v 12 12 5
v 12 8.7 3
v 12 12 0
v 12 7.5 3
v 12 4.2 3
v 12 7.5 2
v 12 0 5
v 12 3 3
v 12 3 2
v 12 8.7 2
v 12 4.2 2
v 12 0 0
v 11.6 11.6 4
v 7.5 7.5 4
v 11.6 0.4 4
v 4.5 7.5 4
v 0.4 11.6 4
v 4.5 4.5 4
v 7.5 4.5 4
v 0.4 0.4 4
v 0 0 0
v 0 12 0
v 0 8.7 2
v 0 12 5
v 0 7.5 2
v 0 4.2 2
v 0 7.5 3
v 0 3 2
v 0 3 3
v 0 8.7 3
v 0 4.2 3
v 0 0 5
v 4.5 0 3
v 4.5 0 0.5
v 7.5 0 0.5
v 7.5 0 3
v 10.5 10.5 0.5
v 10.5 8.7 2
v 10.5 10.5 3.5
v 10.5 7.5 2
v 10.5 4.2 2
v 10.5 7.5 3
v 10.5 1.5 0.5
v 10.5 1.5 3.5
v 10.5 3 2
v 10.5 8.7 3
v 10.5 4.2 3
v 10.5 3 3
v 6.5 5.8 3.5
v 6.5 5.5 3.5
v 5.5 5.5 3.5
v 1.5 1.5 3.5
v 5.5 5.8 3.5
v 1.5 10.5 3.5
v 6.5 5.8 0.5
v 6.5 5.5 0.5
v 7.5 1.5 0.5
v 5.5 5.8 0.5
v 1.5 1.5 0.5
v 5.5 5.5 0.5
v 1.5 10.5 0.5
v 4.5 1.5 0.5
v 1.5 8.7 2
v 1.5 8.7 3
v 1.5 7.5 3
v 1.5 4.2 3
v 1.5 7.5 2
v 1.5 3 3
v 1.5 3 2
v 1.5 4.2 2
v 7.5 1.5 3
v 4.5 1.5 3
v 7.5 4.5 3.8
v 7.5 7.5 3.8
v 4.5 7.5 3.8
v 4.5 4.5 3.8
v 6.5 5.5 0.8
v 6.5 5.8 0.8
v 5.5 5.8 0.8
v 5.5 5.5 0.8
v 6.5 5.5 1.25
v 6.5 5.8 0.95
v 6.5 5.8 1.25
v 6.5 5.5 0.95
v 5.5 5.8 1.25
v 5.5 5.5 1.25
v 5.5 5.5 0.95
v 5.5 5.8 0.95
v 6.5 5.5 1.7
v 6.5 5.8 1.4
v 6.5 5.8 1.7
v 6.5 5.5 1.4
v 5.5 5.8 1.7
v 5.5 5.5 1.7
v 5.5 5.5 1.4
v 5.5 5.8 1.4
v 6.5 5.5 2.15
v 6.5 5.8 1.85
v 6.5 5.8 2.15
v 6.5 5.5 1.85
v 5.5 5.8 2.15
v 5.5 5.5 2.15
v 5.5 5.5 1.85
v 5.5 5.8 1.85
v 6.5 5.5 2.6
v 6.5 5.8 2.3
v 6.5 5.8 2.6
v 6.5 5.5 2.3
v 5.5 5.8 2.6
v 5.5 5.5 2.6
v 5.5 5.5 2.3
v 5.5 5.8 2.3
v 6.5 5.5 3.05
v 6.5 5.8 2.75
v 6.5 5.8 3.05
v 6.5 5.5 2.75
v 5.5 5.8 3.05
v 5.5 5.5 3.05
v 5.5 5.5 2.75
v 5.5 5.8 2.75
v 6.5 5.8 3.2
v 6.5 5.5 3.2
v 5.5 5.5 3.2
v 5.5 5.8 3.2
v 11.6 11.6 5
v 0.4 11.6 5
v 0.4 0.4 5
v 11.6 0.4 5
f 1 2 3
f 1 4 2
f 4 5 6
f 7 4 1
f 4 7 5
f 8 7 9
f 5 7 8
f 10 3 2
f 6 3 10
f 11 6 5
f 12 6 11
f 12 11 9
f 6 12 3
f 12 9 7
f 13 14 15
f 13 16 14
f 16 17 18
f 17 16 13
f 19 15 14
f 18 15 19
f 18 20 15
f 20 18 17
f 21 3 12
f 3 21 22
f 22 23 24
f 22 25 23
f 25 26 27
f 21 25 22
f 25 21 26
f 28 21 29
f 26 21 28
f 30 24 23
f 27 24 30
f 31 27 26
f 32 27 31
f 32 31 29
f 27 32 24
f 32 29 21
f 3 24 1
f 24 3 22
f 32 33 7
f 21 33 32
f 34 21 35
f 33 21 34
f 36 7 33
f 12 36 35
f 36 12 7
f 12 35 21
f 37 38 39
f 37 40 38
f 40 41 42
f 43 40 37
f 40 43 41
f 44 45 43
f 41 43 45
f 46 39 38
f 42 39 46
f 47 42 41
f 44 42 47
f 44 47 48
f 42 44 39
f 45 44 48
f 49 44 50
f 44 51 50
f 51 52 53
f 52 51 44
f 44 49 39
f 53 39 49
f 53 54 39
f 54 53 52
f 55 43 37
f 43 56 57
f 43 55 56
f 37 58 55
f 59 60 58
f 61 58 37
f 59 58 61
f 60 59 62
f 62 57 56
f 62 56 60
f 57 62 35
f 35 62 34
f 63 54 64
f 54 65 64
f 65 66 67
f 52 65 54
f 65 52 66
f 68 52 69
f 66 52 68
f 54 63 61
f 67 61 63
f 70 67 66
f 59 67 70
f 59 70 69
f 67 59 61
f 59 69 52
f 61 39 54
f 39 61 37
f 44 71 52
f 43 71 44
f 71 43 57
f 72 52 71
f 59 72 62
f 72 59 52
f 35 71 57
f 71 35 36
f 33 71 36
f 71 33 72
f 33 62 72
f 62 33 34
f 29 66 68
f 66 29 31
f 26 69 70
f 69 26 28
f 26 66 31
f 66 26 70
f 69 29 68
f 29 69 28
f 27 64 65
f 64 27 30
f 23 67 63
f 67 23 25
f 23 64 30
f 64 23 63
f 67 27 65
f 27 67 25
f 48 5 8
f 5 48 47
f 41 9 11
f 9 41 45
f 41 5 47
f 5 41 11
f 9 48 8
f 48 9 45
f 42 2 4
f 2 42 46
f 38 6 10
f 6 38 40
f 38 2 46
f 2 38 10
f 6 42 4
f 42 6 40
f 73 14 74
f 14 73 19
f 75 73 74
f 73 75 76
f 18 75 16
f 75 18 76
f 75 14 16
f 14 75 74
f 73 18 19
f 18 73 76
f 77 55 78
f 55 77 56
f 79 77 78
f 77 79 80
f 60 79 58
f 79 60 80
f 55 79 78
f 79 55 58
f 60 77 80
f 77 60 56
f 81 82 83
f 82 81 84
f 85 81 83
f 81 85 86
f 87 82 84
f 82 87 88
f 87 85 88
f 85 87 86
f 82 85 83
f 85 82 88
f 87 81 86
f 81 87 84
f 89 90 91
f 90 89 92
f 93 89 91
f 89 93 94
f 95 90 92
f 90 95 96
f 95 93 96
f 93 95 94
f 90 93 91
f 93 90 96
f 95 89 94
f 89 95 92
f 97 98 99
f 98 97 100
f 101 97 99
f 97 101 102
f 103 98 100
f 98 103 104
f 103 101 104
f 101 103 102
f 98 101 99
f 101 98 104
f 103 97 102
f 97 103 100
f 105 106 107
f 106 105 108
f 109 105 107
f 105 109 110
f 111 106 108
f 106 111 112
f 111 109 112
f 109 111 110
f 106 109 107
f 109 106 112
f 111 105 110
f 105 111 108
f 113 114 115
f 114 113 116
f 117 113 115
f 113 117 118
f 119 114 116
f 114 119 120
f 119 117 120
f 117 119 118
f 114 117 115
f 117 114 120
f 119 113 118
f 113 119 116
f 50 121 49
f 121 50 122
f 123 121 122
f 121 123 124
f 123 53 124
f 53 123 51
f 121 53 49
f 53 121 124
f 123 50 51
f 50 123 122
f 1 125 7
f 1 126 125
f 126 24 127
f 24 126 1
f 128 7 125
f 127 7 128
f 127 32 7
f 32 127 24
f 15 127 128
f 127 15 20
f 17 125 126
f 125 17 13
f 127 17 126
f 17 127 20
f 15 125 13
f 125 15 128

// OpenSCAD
// 可进入暗堡/炮位 - 厚墙射击孔 + 内部小空间 + 爬梯上顶射击位
// 外 12(x) × 12(y) × 4(z); 墙厚 1.5; 内部中空可进
// +X = 右, +Y = 前(门朝此), +Z = 上

module pillbox() {
  difference() {
    cube([12, 12, 4]);
    // 内腔 (留 0.5 地台)
    translate([1.5, 1.5, 0.5]) cube([9, 9, 3]);
    // 门 (y=0 面) w3 h2.5
    translate([4.5, -0.1, 0.5]) cube([3, 1.6, 2.5]);
    // 四向射击孔 (上下两排)
    translate([-0.1, 3, 2]) cube([1.6, 1.2, 1]);
    translate([-0.1, 7.5, 2]) cube([1.6, 1.2, 1]);
    translate([10.5, 3, 2]) cube([1.6, 1.2, 1]);
    translate([10.5, 7.5, 2]) cube([1.6, 1.2, 1]);
    // 顶开口上射击位
    translate([4.5, 4.5, 3.8]) cube([3, 3, 0.5]);
  }
}

module ladder() {
  // 内部爬梯到顶
  for (i = [0 : 1 : 6]) {
    translate([5.5, 5.5, 0.5 + i * 0.45]) cube([1, 0.3, 0.3]);
  }
}

color("#8a8a82") pillbox();
color("#6b6b63") ladder();
// 顶射击位护栏
color("#55554f") translate([0, 0, 4]) {
  cube([12, 0.4, 1]);
  translate([0, 11.6, 0]) cube([12, 0.4, 1]);
  cube([0.4, 12, 1]);
  translate([11.6, 0, 0]) cube([0.4, 12, 1]);
}
